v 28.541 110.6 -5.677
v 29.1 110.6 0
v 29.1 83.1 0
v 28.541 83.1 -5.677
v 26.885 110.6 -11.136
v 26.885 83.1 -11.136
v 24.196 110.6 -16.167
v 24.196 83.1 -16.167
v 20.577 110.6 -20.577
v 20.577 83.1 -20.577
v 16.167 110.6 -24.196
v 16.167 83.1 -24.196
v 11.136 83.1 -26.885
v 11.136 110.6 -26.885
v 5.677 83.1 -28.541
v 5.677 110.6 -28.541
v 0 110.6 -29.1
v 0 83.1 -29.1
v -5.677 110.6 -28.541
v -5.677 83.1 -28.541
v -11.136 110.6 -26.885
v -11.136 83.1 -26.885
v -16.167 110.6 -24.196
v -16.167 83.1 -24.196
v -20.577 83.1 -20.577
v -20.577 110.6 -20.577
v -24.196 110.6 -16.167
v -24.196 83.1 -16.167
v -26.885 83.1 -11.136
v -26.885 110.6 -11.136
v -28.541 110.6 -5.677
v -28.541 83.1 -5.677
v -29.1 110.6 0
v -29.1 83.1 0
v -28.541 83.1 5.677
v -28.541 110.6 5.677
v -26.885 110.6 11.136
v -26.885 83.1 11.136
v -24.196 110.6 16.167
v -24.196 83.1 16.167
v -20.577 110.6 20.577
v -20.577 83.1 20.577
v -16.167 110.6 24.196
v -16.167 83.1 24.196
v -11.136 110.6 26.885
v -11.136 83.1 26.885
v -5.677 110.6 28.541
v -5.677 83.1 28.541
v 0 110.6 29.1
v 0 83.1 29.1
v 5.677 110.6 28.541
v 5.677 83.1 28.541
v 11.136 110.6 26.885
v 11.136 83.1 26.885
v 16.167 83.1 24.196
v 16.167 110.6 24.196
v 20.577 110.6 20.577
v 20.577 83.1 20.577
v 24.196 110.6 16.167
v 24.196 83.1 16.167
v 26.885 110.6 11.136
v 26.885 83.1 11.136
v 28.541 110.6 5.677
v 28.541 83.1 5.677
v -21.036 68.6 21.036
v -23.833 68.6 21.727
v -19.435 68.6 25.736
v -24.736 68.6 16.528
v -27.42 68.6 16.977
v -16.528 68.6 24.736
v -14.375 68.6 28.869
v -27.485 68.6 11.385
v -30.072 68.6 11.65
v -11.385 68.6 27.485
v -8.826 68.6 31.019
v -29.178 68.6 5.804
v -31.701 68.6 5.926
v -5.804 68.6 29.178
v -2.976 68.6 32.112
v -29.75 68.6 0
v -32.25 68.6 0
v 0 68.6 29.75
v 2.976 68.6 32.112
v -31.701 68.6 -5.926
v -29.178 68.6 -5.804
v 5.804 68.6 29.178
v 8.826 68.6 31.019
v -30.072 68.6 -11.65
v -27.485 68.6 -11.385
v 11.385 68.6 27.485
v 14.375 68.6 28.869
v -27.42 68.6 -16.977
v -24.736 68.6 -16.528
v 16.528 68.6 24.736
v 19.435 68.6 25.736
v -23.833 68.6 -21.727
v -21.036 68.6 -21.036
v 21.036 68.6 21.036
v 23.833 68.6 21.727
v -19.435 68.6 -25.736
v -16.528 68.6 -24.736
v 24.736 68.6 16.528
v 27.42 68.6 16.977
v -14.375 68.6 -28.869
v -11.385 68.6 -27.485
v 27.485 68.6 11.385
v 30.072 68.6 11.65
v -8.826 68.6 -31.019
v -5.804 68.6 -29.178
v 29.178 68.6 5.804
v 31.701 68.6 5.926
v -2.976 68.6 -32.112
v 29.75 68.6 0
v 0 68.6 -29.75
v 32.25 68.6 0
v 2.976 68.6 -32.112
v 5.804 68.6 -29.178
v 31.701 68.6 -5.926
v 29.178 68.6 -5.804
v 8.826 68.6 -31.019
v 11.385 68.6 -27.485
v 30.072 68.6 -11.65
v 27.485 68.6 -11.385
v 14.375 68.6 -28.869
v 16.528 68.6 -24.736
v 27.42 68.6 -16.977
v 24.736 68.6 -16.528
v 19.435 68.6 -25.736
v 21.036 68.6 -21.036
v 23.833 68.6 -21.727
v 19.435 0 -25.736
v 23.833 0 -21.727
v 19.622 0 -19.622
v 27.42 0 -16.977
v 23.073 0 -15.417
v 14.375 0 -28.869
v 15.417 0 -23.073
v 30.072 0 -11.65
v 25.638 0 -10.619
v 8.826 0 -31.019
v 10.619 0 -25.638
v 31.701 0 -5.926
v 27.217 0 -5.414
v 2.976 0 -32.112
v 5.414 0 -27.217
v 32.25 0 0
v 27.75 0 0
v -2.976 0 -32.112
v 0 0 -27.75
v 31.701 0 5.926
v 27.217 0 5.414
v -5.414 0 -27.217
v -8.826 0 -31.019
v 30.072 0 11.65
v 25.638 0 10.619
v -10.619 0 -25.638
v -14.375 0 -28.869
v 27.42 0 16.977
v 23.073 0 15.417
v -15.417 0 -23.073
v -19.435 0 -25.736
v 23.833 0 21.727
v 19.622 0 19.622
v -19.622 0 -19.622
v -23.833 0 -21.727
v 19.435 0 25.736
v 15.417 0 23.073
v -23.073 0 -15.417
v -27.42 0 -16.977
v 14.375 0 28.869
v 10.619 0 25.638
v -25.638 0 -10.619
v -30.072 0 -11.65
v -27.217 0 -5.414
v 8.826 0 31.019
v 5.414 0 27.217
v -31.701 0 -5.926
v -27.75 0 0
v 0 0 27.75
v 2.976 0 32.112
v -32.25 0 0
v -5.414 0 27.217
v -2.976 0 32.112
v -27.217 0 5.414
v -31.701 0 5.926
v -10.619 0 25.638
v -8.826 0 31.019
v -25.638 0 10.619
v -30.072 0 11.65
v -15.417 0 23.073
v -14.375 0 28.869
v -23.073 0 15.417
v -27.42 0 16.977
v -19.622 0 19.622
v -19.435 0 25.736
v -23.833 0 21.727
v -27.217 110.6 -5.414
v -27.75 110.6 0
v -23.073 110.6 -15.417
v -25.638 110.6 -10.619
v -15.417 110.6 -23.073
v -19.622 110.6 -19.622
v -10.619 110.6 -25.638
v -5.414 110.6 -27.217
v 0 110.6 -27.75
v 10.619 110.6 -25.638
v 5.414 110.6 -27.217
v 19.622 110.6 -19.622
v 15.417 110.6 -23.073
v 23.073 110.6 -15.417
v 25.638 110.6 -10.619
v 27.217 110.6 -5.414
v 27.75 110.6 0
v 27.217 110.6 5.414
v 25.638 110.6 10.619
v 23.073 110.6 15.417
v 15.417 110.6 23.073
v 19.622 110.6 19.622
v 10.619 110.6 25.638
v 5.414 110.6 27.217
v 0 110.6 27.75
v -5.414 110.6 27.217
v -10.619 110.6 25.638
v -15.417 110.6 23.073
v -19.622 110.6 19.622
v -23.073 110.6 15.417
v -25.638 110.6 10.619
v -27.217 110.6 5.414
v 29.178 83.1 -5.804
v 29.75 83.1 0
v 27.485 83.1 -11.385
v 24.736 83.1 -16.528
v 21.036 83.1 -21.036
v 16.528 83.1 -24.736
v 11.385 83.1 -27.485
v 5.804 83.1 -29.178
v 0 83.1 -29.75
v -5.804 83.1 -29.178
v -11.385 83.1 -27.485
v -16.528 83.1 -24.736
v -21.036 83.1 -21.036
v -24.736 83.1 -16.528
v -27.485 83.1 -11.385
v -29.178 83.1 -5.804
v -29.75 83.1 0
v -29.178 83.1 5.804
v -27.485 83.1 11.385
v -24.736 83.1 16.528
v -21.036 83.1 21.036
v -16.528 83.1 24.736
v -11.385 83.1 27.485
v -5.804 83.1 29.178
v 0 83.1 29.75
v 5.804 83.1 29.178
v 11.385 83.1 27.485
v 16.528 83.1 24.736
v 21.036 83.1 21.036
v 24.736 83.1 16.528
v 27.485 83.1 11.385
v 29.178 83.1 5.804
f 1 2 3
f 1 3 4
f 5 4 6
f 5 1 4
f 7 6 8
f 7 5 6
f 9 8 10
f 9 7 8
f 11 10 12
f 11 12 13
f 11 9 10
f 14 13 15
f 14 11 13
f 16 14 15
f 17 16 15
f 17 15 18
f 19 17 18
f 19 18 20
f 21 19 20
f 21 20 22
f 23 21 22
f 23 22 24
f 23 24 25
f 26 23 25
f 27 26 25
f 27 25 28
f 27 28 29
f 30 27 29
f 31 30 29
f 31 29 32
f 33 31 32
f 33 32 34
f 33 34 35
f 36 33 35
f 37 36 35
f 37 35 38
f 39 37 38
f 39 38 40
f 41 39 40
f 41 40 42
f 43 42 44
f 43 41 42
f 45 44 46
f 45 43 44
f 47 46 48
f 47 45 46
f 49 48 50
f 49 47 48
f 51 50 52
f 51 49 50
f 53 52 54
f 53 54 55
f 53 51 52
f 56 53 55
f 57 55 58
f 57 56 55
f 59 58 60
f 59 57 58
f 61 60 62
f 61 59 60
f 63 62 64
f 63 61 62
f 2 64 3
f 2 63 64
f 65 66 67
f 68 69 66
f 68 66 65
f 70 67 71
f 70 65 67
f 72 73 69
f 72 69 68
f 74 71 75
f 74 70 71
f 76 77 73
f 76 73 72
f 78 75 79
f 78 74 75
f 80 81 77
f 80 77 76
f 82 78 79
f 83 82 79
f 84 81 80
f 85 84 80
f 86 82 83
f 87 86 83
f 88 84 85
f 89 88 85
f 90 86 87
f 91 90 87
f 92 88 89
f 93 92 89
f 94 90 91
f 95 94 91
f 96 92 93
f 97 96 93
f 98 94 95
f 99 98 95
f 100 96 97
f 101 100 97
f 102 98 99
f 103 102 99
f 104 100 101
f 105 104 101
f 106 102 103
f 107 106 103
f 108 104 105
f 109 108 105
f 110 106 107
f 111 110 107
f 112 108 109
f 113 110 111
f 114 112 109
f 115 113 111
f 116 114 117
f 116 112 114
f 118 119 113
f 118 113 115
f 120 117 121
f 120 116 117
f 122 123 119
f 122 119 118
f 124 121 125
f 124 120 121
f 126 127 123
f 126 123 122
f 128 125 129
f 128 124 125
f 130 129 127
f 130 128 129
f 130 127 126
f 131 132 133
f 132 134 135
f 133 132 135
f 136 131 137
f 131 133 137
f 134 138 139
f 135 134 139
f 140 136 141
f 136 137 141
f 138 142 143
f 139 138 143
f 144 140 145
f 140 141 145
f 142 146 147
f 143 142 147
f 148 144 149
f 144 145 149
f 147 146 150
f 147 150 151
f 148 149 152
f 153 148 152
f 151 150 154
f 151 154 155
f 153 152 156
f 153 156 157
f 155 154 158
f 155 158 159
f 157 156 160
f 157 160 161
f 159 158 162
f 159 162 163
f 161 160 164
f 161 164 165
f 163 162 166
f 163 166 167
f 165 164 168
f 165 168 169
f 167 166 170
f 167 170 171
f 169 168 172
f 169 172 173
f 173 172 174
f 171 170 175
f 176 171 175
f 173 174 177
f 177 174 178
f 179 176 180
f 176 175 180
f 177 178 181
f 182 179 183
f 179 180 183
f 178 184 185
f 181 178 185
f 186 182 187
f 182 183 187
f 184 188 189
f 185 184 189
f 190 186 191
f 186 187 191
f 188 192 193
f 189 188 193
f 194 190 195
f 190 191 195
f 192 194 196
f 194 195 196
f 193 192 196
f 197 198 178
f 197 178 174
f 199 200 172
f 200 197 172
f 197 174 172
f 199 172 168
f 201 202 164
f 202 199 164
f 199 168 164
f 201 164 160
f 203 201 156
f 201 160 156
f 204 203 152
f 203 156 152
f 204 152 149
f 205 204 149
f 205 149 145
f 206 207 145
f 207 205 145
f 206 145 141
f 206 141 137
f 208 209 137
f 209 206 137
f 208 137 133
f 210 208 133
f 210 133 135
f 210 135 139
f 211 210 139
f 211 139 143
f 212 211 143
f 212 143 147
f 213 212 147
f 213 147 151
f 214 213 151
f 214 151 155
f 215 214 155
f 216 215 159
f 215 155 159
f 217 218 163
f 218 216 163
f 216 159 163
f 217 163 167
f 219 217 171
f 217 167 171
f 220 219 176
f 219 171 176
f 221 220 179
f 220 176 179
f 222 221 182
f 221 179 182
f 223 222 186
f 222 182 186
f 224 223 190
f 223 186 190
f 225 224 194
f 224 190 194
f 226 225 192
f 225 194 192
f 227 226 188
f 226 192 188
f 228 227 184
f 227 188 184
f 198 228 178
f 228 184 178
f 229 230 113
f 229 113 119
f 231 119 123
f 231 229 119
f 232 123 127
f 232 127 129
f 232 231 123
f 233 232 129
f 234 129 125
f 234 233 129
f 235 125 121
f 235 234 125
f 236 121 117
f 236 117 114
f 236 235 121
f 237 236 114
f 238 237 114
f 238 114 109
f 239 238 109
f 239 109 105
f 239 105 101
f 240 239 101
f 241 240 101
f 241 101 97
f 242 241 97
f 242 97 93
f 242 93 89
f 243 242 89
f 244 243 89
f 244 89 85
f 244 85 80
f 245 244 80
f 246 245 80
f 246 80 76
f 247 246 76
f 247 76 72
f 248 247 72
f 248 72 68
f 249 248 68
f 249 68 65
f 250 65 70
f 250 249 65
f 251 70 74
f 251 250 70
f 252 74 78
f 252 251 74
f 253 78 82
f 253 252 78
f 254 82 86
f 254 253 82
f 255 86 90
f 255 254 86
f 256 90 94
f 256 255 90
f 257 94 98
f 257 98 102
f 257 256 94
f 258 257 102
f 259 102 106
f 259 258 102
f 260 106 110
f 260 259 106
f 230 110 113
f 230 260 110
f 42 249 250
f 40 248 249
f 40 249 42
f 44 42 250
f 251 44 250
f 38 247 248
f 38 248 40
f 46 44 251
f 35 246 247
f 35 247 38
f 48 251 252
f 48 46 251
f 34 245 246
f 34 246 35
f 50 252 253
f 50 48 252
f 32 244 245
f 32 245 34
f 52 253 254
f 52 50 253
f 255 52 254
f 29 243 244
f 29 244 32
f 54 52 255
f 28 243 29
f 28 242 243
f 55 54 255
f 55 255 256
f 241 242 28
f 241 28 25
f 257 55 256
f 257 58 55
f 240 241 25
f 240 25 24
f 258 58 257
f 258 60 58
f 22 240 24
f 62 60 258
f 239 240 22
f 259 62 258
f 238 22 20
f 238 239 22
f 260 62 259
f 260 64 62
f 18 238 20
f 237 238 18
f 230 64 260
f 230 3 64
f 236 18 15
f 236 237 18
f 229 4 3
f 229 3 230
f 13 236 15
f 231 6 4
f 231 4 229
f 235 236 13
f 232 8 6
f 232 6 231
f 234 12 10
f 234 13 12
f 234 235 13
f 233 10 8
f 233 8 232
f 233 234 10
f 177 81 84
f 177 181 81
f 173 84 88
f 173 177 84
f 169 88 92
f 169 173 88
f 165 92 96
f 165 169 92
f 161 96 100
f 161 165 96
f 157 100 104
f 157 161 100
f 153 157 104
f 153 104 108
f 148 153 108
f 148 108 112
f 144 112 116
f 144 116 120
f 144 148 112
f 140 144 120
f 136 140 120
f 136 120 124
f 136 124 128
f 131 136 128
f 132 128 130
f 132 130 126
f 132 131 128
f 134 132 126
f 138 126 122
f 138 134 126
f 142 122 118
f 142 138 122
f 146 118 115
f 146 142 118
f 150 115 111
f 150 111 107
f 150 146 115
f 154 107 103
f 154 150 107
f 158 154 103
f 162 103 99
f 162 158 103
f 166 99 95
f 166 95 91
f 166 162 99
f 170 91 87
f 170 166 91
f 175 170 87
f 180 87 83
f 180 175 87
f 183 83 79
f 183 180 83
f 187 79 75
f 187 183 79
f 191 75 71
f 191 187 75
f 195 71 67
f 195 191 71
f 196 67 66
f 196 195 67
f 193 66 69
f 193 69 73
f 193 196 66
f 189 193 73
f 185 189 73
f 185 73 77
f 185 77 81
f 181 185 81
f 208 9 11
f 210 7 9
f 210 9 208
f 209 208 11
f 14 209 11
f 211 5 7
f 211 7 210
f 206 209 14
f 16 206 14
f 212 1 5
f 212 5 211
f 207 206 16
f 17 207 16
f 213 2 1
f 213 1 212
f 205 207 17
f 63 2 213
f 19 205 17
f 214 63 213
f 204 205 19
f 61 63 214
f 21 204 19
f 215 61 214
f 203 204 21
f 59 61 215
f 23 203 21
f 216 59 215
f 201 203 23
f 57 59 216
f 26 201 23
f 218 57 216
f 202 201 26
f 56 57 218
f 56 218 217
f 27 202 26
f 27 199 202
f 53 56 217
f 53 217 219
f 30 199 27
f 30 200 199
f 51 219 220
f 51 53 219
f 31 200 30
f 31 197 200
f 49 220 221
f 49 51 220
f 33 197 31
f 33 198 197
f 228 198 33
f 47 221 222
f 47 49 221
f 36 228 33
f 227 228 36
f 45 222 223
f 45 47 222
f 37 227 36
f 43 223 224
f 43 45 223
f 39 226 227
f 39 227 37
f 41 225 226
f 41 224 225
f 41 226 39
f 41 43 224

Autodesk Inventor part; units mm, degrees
sketch "Sketch1" plane through (0, 0, 0) normal (0, 1, 0) x (-1, 0, 0)
  circle A0 centre (0, 0) radius 27.75
  circle A1 centre (0, 0) radius 32.25
  dimension "d0" = 55.5
  dimension "d1" = 64.5
extrude "Extrusion1" add sketch "Sketch1" along normal blind 110.6
ref_plane "Work Plane1" through (0, 7.749, 0) normal (0, 1, 0) x (-1, 0, 0)
ref_plane "Work Plane2" through (0, 16.1, 0) normal (0, 1, 0) x (-1, 0, 0)
ref_plane "Work Plane3" through (0, 113.3, 0) normal (0, 1, 0) x (-1, 0, 0)
sketch "Sketch17" plane through (0, 110.6, 0) normal (0, 1, 0) x (1, 0, 0)
  circle A0 centre (0, 0) radius 29.75
  circle A1 centre (0, 0) radius 32.25
  dimension "d109" = 59.5
extrude "Extrusion8" cut sketch "Sketch17" against normal blind 42
thread "Thread7" size "M60x5.5" class "6g" standard "ANSI Metric M Profile" full length
sketch "Sketch18" plane through (0, 110.6, 0) normal (0, 1, 0) x (1, 0, 0)
  circle A0 centre (0, 0) radius 32.1723
  circle A1 centre (0, 0) radius 29.1
  dimension "d114" = 58.2
extrude "Extrusion9" cut sketch "Sketch18" against normal blind 27.5
properties part number "Vacuum Cylinder"
